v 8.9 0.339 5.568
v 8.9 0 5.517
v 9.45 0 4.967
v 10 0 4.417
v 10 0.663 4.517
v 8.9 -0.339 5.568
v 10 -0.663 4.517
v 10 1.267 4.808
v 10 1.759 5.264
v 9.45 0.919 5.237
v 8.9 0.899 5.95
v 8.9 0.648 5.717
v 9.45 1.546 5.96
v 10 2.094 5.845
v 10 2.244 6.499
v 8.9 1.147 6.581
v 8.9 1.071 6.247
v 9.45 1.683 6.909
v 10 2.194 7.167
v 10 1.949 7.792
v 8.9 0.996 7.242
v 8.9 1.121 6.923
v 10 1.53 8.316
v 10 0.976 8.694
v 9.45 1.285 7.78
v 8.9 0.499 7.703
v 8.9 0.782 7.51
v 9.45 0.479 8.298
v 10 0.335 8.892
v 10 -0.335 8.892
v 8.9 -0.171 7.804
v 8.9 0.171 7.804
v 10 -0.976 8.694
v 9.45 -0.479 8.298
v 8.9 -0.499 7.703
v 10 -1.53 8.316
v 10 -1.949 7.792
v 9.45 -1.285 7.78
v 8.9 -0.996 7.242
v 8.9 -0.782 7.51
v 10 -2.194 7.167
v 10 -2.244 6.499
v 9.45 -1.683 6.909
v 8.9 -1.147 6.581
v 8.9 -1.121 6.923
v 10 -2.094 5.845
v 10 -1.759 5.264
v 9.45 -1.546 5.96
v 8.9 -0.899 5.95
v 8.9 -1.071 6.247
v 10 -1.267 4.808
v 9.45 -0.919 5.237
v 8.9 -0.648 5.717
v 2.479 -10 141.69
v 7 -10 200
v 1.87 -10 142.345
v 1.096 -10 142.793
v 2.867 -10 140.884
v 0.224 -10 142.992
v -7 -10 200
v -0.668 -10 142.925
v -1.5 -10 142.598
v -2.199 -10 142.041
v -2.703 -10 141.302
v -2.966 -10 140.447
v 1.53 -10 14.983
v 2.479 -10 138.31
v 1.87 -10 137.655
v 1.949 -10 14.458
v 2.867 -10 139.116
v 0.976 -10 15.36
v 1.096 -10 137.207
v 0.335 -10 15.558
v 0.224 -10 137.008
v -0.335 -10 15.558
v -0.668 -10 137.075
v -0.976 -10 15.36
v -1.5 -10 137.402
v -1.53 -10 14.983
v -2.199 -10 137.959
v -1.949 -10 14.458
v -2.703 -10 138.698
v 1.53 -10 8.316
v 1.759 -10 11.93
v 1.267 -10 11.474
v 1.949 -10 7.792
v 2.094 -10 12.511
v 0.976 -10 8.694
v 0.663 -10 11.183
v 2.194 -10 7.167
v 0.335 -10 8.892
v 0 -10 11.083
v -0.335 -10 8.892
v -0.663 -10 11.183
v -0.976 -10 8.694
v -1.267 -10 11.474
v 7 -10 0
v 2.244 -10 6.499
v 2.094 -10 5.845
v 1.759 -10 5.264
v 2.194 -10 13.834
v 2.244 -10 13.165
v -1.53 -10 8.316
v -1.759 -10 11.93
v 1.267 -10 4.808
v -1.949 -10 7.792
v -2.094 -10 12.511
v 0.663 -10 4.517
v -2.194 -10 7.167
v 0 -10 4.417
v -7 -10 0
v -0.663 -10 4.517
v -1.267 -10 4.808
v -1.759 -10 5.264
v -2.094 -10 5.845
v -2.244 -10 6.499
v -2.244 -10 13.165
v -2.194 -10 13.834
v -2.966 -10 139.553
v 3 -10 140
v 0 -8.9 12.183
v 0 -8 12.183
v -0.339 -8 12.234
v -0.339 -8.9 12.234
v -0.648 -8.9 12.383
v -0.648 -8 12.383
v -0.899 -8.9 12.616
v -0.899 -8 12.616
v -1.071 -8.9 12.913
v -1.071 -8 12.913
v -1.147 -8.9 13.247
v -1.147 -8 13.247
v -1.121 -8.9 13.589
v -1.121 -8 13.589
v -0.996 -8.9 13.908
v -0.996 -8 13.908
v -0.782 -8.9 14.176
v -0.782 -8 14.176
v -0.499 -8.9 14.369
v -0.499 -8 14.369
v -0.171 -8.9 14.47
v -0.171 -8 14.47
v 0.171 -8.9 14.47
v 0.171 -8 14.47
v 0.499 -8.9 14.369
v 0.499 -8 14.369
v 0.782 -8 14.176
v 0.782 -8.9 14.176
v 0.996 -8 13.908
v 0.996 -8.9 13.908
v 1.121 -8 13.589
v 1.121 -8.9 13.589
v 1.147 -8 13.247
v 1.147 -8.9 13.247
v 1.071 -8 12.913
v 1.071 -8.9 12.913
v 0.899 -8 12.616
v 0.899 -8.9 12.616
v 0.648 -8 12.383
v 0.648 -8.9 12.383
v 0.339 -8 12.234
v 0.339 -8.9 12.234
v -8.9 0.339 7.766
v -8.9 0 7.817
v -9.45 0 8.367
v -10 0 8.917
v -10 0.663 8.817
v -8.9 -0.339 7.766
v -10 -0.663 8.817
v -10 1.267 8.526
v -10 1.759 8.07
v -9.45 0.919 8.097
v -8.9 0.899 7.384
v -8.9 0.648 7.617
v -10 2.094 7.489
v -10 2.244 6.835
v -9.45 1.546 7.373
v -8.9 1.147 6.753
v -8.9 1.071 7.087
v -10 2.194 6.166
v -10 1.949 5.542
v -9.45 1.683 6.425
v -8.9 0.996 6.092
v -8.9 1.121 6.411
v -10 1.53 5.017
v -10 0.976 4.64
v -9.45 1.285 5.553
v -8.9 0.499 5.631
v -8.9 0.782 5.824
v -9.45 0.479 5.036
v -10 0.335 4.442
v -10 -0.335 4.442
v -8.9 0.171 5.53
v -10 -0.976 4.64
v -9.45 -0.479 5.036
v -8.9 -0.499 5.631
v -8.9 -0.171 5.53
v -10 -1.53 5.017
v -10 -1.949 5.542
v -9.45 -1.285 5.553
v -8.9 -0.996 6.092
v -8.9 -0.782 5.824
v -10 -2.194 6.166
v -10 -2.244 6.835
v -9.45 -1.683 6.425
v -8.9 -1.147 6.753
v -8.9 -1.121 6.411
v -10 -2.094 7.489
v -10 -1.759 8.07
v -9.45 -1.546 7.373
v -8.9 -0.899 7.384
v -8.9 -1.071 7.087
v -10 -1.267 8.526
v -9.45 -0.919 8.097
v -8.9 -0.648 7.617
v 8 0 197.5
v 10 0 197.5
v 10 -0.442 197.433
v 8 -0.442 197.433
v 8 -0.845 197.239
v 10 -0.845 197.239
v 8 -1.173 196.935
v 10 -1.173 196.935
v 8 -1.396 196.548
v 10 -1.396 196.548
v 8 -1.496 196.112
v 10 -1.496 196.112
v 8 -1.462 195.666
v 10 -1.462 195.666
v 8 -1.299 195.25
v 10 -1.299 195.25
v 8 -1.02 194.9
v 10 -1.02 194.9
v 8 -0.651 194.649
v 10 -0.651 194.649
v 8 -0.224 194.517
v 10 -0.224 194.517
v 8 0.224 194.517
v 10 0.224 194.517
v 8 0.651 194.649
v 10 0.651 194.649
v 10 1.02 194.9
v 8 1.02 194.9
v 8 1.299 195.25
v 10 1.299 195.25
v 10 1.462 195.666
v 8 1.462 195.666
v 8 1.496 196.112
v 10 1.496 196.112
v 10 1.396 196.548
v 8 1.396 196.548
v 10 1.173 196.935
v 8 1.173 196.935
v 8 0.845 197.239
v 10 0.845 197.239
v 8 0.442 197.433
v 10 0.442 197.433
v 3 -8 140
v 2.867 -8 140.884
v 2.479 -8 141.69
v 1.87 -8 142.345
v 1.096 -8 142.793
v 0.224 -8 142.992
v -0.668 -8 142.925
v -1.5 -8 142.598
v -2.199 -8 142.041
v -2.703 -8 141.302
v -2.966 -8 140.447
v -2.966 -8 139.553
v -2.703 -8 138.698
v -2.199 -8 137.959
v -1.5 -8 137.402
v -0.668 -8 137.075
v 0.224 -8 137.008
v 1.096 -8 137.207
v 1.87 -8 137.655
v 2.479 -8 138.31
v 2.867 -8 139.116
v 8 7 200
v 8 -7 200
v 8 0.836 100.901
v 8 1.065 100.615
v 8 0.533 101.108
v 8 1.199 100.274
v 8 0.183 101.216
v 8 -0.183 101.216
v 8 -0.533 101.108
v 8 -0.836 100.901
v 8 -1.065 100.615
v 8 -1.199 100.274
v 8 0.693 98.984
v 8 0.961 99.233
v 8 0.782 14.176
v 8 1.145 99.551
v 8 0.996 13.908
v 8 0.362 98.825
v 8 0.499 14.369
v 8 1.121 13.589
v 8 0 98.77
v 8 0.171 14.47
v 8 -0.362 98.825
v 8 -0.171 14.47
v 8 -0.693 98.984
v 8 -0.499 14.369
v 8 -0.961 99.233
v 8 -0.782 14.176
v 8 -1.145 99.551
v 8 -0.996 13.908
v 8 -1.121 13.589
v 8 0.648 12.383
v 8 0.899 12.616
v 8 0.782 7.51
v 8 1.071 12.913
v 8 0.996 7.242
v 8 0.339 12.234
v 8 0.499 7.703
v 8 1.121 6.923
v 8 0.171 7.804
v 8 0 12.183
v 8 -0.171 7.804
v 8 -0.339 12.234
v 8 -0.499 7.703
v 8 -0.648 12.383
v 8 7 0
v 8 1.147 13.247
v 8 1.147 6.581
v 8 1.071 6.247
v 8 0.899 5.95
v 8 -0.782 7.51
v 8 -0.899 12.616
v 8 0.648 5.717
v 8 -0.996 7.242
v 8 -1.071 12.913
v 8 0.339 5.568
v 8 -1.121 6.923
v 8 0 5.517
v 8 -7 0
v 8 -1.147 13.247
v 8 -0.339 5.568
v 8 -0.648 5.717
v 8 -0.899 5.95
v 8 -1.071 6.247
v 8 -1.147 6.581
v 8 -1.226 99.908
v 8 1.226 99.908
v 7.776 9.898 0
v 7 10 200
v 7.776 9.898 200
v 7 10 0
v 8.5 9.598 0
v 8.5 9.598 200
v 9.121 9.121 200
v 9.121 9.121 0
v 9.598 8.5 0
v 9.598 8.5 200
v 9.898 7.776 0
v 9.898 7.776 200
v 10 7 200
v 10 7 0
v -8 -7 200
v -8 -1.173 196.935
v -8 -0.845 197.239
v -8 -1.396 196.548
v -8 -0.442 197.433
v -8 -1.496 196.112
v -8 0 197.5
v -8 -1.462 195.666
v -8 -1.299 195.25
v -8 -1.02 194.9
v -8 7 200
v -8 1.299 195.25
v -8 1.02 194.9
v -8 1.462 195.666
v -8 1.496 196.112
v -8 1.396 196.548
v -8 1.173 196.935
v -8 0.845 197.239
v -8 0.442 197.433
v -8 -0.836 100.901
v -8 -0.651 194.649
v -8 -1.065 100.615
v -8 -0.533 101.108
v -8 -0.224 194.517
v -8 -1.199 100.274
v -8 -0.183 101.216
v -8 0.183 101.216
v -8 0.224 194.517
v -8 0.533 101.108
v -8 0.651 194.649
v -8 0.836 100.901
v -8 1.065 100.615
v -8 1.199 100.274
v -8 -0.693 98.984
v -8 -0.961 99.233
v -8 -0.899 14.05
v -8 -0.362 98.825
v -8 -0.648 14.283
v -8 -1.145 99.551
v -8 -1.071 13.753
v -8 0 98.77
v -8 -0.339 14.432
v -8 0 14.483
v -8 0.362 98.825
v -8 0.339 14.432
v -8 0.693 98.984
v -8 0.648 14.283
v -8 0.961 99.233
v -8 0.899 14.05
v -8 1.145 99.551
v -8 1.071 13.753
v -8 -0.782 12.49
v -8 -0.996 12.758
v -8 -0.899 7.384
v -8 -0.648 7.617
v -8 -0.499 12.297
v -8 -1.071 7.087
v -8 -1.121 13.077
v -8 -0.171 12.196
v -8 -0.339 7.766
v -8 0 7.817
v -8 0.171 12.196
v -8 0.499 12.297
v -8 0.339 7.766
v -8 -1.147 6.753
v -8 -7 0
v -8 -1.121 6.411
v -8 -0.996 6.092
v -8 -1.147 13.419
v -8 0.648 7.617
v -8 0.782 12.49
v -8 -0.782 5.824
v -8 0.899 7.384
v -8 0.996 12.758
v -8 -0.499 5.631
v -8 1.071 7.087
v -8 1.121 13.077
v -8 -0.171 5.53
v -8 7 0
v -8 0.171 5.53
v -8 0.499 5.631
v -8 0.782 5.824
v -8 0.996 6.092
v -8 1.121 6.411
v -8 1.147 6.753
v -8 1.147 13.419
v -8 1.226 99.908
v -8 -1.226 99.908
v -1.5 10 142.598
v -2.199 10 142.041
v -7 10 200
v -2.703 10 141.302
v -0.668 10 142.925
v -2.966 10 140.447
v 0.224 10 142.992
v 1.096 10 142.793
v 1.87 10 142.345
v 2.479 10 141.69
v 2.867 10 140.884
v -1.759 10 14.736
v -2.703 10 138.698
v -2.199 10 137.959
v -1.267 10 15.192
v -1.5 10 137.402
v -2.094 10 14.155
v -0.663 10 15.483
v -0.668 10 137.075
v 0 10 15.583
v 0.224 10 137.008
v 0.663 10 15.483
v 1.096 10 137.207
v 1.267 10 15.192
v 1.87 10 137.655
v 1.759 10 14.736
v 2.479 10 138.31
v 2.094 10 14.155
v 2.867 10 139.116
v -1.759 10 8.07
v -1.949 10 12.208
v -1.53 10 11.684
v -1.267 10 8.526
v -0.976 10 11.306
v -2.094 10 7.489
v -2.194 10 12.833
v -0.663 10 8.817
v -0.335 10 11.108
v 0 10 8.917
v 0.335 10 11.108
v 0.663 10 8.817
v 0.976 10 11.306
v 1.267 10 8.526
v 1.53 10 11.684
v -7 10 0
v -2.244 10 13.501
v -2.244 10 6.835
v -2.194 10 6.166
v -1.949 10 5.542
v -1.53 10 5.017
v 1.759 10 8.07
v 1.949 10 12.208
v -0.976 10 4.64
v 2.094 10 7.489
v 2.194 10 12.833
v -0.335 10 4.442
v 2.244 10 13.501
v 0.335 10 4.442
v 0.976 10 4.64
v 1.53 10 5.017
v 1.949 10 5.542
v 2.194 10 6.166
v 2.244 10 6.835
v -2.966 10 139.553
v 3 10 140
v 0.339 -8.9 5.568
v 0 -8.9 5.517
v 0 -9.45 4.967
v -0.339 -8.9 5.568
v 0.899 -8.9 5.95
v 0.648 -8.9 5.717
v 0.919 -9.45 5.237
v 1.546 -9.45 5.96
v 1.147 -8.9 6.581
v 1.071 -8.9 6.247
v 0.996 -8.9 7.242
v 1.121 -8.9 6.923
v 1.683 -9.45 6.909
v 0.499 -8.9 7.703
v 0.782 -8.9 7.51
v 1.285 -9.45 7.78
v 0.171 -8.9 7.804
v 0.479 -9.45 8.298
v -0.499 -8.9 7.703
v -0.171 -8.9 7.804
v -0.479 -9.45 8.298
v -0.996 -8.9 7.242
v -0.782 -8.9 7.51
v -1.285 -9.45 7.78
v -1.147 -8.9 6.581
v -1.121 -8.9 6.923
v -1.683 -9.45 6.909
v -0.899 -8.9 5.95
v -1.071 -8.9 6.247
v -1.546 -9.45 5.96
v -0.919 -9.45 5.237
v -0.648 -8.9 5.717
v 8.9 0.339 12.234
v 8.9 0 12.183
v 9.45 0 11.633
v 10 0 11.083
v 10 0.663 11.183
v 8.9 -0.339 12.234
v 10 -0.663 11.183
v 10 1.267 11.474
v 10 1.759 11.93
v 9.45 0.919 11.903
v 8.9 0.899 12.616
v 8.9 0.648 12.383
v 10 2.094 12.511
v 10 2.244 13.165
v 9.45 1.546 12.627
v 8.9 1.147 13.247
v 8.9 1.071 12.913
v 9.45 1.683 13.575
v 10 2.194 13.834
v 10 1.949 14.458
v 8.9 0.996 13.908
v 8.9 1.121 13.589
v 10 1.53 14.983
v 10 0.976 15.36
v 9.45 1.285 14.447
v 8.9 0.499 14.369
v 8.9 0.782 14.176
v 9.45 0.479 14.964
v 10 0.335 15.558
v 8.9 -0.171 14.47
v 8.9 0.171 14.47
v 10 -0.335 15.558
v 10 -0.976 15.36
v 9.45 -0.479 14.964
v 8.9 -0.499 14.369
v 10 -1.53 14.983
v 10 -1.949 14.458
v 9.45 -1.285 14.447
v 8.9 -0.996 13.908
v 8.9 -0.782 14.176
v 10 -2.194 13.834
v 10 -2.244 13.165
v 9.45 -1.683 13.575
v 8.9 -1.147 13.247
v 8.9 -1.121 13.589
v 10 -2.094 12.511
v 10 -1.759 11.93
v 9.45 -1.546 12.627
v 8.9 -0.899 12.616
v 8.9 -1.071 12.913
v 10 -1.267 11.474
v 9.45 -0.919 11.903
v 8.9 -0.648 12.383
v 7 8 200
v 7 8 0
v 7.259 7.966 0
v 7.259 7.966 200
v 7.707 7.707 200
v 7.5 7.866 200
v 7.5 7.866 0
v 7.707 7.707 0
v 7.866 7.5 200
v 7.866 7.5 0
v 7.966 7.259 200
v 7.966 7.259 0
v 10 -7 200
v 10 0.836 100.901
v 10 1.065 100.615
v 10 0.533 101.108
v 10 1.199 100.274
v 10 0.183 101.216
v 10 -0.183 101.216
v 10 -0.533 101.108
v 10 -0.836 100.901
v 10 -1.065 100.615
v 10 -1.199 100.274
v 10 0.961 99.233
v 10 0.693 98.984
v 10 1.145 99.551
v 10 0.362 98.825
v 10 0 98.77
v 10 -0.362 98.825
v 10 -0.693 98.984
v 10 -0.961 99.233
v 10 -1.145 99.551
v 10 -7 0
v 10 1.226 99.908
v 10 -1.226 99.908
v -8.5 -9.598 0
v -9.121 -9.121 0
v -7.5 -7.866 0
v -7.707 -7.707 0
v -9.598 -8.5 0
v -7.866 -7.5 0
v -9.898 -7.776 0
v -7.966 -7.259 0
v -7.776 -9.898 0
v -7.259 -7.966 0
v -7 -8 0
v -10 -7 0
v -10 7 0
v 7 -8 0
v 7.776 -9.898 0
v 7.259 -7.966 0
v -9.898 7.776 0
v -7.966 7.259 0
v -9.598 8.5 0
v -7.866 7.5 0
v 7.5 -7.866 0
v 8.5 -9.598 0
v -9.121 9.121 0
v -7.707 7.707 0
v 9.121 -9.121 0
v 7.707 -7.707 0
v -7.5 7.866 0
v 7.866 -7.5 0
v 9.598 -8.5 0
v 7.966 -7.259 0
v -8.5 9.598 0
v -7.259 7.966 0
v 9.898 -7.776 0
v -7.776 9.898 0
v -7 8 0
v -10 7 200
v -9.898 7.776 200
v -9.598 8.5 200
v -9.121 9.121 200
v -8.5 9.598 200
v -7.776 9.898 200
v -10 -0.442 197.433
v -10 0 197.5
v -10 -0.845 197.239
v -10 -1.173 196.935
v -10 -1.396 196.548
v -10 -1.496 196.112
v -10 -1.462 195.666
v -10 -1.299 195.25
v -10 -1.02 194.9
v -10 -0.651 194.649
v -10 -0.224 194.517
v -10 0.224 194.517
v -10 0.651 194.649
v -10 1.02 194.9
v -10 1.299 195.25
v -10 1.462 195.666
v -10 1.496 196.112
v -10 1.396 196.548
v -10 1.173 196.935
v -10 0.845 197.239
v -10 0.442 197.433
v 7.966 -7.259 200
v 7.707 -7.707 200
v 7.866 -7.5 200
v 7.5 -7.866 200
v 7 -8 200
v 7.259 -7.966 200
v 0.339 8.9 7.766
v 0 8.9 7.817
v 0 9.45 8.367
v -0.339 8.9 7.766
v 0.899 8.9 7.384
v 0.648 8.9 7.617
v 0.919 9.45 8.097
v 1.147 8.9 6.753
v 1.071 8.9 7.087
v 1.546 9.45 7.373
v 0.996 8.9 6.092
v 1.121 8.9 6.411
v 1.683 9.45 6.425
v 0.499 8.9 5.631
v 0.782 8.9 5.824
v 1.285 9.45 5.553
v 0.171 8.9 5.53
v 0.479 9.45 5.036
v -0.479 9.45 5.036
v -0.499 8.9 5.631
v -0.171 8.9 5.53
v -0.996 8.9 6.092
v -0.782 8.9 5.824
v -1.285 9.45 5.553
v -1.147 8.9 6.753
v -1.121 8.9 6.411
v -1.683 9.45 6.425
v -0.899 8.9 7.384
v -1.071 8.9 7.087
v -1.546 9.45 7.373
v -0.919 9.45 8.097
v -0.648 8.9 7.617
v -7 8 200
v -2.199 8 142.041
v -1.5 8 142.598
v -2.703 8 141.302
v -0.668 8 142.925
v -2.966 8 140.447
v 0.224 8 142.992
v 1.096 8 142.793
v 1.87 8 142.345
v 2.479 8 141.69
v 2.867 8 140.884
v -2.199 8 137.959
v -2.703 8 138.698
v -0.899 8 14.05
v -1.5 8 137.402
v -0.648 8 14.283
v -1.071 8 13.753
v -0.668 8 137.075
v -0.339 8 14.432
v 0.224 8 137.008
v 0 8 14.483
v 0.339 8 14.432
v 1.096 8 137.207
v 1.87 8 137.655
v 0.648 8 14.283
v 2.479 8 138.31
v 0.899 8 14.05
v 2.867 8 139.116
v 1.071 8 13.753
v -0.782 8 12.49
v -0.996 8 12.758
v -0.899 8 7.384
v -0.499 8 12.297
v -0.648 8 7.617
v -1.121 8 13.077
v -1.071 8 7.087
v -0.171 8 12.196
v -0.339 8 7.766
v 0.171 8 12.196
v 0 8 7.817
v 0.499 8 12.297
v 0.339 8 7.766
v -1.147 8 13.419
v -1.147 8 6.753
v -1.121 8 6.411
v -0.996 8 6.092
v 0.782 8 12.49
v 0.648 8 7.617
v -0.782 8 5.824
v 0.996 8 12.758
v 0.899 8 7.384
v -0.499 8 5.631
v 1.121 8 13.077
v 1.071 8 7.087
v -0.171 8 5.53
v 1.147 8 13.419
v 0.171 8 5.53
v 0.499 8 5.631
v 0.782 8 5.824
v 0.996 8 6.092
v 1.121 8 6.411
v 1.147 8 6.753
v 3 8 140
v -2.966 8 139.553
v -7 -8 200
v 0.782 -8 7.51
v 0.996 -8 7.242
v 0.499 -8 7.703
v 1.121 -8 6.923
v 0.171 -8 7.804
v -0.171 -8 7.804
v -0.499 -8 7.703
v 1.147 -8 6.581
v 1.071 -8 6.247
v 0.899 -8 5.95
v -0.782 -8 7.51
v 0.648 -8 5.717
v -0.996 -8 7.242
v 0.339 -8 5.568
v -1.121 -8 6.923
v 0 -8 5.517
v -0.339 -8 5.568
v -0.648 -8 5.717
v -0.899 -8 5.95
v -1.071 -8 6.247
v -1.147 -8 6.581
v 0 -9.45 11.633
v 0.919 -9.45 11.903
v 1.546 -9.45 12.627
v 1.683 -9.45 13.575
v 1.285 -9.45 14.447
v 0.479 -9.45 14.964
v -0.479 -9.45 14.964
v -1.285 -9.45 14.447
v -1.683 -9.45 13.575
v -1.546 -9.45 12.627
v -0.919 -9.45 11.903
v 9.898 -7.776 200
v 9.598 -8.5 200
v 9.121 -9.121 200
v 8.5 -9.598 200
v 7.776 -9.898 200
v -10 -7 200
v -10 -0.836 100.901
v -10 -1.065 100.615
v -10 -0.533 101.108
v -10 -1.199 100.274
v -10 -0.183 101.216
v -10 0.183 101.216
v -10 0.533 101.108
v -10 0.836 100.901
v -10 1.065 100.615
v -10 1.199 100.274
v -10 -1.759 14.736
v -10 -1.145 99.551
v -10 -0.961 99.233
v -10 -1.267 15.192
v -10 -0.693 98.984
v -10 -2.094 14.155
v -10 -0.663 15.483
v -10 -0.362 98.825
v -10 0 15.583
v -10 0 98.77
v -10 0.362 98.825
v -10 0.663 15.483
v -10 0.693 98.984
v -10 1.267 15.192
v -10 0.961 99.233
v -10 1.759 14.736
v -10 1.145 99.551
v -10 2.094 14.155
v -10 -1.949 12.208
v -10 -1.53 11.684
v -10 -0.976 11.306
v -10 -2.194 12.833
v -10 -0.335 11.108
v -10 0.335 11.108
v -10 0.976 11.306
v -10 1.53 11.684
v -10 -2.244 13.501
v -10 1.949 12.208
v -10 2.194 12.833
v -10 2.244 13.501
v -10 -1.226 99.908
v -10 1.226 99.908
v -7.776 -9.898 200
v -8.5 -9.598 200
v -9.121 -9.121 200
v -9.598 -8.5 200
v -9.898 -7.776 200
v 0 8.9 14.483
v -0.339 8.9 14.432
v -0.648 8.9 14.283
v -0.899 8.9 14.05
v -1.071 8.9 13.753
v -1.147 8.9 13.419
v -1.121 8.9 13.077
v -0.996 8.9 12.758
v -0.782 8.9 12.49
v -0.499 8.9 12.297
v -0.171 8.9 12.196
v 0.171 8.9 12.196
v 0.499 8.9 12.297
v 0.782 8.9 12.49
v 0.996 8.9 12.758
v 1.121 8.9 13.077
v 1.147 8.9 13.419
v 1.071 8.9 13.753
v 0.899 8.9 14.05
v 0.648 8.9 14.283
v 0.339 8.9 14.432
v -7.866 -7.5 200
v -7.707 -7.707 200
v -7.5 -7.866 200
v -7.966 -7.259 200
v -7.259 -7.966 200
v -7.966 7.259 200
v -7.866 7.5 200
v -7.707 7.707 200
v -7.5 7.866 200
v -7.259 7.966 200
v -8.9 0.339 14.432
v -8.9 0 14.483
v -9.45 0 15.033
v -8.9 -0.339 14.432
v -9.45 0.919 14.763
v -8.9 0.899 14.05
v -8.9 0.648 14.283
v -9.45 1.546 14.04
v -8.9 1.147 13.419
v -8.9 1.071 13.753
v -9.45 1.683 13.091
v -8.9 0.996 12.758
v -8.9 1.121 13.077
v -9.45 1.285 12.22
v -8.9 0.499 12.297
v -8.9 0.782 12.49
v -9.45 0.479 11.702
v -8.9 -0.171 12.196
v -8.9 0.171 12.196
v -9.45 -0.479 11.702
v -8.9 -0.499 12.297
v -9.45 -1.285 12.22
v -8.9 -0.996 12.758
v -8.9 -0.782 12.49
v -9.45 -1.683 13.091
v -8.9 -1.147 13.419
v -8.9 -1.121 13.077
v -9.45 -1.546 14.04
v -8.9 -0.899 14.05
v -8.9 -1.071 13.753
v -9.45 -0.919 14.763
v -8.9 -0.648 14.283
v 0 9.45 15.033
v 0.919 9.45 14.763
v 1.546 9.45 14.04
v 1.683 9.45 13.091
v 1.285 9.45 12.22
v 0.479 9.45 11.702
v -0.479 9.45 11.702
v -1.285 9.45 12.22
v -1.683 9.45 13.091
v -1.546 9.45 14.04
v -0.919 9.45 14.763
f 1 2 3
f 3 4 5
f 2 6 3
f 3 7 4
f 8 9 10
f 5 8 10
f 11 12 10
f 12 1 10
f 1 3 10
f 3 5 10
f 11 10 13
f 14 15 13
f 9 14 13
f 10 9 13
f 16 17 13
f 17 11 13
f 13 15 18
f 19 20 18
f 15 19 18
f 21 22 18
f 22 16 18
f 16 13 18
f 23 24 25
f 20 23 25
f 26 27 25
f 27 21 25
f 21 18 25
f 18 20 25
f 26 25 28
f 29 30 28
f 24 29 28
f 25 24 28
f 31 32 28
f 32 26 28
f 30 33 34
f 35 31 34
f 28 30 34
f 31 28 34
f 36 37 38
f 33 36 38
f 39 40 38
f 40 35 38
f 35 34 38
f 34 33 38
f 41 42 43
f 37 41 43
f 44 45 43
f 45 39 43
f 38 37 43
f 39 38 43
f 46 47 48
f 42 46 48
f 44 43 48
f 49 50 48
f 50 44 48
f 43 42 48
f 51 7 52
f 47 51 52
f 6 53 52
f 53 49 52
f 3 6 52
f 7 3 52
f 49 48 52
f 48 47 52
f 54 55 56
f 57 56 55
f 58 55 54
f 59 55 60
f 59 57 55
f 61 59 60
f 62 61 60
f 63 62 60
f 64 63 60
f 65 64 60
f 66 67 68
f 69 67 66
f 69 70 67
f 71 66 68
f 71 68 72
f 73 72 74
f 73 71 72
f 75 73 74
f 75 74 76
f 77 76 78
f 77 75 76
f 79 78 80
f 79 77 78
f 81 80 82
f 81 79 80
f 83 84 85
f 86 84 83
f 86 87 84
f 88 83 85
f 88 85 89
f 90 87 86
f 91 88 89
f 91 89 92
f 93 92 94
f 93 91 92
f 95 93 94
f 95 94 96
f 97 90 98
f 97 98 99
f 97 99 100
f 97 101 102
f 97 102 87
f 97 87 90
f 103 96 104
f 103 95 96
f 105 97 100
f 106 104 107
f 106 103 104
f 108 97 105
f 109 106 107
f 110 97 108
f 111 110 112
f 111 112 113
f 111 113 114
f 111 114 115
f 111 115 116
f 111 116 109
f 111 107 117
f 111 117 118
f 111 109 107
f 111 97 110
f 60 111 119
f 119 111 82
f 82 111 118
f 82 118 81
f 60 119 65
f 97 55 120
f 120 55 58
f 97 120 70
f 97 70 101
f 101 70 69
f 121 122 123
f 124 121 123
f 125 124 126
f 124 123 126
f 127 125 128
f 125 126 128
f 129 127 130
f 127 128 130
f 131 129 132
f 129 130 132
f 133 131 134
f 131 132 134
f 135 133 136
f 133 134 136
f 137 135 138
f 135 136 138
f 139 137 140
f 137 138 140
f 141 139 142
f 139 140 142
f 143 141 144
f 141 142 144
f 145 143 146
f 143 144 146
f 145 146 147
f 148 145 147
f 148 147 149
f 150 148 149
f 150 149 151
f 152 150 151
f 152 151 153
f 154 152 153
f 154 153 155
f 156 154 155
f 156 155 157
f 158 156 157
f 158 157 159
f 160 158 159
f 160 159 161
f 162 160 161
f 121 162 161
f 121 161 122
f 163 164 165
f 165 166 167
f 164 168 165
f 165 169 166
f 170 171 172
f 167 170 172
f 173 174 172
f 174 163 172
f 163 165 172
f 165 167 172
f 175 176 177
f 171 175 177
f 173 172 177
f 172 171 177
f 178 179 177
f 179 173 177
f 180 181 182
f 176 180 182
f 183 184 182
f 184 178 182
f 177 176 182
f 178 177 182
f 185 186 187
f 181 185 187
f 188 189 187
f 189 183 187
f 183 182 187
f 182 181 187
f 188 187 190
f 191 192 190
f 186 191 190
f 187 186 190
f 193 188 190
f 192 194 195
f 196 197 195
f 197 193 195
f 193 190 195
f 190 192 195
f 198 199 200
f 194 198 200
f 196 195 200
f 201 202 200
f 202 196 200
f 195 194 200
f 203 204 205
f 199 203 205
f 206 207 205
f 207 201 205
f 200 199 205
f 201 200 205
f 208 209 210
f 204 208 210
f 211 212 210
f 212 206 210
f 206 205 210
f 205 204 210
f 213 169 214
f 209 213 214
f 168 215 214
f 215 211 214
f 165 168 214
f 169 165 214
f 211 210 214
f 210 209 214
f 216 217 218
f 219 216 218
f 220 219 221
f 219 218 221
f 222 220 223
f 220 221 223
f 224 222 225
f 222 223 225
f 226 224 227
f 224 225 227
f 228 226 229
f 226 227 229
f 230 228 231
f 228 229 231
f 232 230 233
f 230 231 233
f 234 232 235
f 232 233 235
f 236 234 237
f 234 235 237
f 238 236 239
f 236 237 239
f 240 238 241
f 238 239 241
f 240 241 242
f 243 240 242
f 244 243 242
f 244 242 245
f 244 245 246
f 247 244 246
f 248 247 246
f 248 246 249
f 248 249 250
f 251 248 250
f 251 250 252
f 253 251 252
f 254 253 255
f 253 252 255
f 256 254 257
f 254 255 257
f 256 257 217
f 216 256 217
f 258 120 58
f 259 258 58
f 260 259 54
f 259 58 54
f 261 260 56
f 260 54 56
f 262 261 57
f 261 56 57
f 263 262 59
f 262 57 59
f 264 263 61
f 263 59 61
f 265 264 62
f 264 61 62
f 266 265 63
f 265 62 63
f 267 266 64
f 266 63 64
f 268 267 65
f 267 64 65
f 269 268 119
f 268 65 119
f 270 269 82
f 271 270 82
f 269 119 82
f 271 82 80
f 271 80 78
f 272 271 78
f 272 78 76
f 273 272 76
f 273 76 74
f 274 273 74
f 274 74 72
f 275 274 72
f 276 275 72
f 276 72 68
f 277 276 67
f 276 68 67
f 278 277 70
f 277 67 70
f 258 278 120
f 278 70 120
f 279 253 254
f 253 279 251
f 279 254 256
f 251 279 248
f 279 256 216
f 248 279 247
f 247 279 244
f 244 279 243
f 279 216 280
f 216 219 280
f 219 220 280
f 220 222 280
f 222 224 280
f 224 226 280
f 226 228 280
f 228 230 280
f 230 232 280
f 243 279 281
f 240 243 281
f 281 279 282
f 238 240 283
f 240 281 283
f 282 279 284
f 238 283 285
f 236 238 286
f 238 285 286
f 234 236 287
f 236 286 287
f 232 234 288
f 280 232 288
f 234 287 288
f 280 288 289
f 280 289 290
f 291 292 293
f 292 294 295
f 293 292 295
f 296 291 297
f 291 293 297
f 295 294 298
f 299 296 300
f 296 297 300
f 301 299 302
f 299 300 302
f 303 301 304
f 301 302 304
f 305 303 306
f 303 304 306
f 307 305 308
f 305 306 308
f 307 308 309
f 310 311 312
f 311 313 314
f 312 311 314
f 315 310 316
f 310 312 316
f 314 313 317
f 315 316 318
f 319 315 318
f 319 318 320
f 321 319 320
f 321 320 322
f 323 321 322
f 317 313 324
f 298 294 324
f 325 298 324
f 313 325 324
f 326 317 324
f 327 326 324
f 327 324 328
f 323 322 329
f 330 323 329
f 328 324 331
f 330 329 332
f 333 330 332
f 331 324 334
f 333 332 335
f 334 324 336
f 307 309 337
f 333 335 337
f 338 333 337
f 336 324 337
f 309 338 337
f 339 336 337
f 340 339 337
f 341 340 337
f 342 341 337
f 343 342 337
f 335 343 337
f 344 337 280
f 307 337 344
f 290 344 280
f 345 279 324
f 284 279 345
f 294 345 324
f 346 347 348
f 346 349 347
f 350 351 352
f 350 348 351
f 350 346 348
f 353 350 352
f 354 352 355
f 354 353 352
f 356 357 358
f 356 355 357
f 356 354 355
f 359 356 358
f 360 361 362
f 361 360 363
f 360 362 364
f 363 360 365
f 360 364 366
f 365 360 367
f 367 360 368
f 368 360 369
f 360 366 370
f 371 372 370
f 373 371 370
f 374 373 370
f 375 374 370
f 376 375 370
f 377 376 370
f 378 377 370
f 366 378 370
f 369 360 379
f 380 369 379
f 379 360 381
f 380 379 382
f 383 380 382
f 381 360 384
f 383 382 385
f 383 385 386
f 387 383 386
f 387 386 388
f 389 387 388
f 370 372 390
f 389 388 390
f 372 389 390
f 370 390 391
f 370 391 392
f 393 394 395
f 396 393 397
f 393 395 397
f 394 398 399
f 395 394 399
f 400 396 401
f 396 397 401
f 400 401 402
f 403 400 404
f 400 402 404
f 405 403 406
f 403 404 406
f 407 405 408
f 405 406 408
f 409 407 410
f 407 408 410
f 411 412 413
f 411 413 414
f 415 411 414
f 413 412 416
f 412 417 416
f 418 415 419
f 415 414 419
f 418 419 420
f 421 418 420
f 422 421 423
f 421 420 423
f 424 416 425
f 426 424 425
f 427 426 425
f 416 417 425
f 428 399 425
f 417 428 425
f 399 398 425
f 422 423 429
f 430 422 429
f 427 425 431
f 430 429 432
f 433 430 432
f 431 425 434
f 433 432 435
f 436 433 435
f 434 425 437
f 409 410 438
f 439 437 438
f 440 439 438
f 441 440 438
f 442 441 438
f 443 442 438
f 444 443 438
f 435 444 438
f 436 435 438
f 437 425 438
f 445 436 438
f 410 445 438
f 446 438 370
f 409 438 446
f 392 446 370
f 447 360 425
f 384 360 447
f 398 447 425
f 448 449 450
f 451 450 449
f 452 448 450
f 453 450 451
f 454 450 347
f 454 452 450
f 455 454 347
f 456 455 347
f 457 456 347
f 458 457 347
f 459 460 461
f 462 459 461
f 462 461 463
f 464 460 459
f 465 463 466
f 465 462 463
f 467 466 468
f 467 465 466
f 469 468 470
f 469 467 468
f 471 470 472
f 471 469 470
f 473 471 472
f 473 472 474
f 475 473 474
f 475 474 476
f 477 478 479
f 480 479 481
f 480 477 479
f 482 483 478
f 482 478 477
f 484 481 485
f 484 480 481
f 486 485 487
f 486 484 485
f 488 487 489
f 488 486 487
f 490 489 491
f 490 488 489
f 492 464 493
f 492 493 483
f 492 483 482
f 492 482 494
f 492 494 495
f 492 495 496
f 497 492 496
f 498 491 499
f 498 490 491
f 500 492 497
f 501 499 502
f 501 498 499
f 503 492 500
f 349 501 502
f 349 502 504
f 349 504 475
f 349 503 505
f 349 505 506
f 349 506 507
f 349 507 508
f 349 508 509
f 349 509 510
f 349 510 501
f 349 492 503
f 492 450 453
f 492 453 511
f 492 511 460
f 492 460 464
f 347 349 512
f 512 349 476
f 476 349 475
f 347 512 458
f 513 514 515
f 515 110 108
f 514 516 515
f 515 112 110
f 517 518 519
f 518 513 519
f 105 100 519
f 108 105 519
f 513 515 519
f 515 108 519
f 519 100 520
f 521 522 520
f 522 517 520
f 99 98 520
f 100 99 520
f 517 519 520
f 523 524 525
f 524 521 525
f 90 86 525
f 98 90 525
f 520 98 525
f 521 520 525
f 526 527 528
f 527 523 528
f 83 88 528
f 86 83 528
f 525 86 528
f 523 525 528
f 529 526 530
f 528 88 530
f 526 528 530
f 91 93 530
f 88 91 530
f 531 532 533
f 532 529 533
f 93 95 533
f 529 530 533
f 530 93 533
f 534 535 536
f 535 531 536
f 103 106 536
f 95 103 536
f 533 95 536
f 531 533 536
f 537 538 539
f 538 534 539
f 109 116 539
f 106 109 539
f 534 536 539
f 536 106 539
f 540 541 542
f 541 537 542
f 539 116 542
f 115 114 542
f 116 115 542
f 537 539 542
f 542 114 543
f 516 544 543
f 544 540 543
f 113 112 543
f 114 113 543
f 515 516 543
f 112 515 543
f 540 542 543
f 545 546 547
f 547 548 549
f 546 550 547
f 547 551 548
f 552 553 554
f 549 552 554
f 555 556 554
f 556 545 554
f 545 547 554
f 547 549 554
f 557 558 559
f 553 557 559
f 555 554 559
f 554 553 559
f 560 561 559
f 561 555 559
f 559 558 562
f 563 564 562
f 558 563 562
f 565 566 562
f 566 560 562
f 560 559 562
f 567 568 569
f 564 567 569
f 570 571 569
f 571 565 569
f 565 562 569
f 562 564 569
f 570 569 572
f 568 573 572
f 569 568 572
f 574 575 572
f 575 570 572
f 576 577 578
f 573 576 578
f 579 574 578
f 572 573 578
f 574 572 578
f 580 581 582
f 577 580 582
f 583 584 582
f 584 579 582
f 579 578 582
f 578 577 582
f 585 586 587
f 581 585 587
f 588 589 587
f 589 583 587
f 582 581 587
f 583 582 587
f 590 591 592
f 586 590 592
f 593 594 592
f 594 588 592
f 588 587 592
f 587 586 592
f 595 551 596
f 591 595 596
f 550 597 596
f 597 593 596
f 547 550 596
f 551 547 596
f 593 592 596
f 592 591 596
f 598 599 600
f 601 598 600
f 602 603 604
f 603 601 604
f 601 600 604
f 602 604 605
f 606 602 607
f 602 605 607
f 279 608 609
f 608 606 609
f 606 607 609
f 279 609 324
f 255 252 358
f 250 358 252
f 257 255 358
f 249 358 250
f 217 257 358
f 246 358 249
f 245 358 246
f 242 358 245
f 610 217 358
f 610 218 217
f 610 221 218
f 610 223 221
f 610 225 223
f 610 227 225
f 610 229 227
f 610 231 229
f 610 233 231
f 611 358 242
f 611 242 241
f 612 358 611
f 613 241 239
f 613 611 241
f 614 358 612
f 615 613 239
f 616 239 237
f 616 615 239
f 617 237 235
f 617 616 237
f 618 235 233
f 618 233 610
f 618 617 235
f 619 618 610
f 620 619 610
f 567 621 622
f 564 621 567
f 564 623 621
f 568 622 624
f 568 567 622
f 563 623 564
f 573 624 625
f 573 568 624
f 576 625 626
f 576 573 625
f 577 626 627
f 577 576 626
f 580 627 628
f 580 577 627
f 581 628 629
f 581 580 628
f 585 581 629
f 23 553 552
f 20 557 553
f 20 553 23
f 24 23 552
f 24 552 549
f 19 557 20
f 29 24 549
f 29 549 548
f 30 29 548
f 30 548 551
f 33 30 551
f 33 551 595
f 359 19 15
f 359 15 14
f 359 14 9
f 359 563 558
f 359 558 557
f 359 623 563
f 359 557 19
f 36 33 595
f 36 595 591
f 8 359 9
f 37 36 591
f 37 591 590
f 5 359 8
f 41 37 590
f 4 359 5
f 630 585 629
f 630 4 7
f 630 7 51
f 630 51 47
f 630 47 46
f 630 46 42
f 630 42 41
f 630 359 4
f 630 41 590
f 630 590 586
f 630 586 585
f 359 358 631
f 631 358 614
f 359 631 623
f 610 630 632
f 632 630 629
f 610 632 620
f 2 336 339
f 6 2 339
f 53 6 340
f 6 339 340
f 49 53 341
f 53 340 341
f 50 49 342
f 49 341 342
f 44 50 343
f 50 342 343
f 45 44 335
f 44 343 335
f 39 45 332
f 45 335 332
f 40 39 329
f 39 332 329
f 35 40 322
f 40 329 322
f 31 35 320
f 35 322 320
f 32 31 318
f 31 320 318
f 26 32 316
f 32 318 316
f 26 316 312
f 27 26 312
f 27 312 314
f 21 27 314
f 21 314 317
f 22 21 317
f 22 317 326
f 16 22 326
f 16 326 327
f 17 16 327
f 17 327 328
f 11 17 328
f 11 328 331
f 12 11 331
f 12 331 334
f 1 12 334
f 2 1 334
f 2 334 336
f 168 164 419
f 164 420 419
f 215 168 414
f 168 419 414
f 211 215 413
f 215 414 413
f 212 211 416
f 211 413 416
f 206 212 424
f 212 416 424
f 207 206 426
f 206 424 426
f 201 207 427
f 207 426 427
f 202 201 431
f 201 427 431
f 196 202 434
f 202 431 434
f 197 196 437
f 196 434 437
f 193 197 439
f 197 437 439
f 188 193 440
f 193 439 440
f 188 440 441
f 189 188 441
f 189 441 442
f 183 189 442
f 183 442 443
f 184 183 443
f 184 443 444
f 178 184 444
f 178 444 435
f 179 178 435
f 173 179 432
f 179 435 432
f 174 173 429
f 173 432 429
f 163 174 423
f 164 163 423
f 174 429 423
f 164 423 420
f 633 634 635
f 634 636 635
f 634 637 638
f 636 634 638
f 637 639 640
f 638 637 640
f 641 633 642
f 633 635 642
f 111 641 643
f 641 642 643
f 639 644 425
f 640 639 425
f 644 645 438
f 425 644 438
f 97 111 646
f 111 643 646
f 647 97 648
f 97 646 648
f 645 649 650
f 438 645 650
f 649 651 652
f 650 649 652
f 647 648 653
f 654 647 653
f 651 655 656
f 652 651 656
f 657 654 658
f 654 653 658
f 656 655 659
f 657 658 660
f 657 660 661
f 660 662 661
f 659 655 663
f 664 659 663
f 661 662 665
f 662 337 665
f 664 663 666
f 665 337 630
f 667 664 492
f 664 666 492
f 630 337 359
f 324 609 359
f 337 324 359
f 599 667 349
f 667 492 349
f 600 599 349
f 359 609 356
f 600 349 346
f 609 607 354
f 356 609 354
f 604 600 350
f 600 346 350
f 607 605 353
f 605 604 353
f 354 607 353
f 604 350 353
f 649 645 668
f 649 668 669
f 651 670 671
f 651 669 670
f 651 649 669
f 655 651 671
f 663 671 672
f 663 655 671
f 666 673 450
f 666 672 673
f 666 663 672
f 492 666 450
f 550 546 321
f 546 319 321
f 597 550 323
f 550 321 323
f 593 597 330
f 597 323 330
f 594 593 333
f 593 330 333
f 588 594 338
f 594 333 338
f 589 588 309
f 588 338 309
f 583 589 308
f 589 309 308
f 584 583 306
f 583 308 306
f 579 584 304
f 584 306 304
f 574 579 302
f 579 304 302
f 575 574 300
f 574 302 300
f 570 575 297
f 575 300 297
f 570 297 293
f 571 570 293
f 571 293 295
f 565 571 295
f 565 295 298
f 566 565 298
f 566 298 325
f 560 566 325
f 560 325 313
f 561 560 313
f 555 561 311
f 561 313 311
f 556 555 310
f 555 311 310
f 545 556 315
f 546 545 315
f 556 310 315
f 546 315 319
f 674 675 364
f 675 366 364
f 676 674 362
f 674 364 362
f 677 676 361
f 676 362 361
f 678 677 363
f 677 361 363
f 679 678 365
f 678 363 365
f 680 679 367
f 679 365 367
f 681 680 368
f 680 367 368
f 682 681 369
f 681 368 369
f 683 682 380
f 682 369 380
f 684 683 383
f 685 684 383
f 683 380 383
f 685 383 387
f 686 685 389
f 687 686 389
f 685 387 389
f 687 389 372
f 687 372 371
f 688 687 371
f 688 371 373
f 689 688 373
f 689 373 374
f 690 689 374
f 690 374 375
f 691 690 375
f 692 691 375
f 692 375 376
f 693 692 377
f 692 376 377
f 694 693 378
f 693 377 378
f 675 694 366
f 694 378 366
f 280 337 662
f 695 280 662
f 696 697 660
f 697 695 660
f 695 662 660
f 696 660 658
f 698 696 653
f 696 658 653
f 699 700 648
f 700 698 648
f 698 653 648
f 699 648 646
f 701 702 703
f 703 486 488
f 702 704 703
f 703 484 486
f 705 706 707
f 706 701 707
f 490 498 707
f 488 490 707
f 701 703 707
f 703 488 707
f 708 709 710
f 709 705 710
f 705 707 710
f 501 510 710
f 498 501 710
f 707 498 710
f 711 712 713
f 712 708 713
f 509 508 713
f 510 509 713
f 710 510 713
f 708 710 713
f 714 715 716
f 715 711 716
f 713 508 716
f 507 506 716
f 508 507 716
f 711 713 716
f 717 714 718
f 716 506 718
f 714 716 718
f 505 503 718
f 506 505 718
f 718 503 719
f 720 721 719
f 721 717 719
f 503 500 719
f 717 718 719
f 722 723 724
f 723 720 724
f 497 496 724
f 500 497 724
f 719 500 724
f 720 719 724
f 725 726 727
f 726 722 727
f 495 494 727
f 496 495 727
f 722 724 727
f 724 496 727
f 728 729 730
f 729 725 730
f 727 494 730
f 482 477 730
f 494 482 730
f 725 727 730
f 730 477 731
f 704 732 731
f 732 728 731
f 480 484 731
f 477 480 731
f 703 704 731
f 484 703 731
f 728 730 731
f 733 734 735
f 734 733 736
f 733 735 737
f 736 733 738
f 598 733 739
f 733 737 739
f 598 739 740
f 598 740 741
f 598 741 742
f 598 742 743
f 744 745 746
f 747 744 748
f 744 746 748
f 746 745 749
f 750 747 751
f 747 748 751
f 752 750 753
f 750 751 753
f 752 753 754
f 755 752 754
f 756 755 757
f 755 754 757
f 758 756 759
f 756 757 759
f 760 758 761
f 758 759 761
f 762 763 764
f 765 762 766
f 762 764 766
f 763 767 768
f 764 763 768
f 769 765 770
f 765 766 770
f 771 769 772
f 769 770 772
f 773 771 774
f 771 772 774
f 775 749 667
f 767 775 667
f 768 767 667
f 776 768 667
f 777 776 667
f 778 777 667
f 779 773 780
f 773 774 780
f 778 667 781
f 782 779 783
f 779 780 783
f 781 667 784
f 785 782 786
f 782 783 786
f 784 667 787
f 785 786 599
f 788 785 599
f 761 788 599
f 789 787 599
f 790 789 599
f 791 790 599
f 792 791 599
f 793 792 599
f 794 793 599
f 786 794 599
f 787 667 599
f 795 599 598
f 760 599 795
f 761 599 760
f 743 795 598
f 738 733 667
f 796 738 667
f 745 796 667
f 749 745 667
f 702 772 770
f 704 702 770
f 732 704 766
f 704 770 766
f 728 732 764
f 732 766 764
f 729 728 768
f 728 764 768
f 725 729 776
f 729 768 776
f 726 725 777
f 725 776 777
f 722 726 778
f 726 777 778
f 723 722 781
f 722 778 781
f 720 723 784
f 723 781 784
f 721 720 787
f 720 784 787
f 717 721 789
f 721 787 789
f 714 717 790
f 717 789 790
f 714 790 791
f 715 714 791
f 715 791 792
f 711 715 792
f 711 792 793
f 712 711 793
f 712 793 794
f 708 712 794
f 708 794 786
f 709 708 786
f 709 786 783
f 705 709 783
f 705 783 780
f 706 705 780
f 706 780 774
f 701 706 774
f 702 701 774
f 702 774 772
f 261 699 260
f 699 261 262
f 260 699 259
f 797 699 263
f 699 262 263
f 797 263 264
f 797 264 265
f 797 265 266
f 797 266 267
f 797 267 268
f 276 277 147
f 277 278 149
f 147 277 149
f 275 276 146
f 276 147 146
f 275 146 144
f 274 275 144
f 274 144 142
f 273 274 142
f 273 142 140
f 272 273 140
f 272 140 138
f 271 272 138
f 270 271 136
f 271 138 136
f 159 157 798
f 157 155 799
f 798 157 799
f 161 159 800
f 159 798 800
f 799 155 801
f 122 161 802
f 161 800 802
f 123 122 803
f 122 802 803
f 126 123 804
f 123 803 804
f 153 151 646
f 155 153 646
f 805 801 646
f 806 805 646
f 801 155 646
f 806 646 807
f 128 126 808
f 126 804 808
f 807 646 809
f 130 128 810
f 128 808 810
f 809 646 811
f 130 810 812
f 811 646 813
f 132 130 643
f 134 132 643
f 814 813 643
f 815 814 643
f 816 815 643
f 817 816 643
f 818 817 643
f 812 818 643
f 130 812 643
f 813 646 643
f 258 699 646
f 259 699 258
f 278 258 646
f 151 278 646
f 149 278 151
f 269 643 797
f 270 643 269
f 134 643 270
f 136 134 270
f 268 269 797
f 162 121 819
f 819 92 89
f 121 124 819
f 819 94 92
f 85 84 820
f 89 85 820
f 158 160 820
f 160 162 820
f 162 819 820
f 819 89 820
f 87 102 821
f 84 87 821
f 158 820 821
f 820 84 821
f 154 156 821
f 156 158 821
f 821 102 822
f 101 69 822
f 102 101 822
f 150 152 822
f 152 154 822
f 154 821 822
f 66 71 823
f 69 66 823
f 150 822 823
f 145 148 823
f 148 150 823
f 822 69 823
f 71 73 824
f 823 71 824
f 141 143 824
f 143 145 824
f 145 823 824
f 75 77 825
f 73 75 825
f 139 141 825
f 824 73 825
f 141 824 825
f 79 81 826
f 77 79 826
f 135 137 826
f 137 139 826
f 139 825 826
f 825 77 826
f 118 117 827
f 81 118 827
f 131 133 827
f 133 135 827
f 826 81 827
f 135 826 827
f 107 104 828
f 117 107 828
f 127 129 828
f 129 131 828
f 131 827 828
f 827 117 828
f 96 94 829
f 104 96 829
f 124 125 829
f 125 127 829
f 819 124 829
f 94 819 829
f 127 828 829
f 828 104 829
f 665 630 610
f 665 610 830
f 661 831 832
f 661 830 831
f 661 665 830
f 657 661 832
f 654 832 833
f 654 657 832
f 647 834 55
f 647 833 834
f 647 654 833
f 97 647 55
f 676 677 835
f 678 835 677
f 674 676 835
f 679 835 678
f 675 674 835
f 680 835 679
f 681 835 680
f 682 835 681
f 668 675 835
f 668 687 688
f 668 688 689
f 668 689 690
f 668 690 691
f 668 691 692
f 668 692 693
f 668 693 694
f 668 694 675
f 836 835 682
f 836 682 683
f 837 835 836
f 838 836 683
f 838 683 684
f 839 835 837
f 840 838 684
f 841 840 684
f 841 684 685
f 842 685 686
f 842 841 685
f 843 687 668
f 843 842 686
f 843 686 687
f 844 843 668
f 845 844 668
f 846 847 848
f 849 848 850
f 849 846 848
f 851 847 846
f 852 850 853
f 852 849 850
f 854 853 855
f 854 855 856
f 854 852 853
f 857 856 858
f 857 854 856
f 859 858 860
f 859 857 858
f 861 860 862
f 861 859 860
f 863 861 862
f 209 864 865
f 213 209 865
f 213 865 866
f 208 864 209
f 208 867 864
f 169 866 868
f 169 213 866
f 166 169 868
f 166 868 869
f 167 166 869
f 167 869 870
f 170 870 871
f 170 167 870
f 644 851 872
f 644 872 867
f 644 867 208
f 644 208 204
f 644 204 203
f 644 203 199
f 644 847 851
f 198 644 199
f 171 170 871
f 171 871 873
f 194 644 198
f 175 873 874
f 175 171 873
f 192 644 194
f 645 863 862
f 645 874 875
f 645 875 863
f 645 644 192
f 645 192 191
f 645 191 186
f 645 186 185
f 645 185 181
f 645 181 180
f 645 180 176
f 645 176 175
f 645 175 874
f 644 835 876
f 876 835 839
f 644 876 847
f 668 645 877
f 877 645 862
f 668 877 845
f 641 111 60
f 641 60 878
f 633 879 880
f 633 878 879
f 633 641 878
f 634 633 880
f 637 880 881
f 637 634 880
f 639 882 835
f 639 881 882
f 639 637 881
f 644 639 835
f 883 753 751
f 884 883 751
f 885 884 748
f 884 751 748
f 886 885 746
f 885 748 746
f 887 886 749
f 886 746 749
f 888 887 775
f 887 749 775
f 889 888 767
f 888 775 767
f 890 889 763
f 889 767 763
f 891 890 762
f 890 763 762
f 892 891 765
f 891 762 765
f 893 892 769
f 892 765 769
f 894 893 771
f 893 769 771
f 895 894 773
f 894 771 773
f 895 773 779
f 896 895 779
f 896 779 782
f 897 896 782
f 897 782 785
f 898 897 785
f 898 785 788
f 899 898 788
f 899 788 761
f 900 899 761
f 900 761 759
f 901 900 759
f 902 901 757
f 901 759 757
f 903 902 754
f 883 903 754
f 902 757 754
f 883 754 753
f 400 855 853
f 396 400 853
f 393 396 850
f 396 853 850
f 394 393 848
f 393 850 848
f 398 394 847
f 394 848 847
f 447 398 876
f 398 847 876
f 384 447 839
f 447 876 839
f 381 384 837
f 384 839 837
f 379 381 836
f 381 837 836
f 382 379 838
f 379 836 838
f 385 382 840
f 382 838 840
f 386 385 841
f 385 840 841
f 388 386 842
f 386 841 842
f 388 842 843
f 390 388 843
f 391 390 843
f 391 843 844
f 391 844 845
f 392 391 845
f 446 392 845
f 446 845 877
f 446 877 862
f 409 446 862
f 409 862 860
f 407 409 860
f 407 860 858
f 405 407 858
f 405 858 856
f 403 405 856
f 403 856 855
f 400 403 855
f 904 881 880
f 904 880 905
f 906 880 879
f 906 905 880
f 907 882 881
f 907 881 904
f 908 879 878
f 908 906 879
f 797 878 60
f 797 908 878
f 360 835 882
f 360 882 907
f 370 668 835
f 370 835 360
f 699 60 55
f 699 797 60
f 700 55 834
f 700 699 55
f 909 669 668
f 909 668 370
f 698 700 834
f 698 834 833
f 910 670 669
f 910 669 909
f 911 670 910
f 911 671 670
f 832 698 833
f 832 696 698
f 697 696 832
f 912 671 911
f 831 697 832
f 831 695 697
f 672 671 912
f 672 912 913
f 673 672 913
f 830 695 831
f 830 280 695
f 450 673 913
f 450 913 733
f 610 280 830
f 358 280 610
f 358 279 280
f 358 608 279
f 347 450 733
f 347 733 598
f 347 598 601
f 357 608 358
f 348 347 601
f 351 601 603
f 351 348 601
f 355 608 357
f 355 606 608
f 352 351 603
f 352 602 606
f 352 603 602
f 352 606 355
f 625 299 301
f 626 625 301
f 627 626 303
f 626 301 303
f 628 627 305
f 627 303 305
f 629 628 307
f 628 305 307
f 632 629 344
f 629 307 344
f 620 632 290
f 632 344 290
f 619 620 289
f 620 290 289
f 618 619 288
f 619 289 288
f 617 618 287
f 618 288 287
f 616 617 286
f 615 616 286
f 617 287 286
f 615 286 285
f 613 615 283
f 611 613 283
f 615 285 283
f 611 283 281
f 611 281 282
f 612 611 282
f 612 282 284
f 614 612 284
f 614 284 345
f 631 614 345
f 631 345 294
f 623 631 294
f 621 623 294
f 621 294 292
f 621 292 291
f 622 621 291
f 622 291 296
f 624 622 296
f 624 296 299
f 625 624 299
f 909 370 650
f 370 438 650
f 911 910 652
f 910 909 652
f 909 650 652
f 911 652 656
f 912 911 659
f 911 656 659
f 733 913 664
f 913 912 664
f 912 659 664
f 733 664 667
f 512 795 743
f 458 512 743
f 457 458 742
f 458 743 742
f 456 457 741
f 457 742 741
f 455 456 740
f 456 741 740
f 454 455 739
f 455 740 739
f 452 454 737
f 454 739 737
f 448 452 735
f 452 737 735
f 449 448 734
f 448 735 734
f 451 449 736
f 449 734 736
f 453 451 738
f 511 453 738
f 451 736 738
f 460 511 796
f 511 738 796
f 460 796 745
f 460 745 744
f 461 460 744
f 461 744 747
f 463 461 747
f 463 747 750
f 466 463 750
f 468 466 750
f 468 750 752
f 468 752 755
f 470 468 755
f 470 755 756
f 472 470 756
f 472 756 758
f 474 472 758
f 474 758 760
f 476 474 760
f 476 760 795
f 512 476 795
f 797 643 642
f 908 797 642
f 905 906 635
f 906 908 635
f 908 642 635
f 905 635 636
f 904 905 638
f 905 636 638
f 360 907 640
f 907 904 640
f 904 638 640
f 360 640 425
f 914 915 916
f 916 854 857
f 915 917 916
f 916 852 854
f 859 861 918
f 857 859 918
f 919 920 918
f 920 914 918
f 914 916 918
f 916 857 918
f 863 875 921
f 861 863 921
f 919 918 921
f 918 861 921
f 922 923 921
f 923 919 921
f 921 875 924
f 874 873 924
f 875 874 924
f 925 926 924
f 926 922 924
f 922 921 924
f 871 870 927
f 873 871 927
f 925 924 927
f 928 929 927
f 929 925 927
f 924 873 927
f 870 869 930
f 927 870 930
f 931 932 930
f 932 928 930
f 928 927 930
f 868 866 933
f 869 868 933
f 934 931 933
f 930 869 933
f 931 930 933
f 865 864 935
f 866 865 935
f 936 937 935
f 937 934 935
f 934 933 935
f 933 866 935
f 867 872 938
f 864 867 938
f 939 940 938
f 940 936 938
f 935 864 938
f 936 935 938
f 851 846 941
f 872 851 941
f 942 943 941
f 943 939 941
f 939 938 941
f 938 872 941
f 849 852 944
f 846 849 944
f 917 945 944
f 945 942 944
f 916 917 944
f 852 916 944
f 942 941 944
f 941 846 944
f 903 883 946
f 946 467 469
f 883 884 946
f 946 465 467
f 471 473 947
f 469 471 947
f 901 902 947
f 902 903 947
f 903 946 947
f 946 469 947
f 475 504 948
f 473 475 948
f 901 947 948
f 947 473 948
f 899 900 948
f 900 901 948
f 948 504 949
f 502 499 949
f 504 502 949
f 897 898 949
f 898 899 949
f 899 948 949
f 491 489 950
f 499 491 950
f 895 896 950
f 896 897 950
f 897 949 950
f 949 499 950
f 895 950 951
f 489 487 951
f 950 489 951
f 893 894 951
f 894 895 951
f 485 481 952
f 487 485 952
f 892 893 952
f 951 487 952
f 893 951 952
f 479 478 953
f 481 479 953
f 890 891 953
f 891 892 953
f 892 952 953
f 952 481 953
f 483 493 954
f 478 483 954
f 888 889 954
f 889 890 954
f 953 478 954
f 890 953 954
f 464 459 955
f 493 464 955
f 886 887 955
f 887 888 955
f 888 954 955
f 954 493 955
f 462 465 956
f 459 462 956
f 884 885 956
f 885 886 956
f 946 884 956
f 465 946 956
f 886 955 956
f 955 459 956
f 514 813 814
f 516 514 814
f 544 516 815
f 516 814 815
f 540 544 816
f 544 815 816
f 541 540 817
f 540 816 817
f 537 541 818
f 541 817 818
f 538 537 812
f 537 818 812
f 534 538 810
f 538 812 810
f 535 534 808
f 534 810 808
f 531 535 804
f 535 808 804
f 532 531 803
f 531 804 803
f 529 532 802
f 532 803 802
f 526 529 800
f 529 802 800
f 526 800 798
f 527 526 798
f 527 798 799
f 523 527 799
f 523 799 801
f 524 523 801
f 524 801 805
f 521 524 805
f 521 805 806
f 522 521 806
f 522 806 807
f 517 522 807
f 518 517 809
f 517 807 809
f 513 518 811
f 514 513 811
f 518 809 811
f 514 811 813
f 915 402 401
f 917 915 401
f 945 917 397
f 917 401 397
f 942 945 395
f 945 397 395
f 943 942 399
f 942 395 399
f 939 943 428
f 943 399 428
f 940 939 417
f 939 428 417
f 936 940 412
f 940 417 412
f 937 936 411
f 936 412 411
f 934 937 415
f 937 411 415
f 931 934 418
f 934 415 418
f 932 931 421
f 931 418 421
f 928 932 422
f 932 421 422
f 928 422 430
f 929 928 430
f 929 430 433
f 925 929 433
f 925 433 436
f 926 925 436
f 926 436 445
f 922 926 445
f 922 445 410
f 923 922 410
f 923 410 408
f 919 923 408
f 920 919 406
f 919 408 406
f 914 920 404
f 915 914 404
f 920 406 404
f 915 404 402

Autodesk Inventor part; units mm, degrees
ref_plane "YZ Plane" through (0, 0, 0) normal (1, 0, 0) x (0, 1, 0)
ref_plane "Startebene" through (0, 0, 0) normal (0, 0, 1) x (1, 0, 0)
ref_plane "Endebene" through (0, 0, 200) normal (0, 0, 1) x (1, 0, 0)
sketch "Skizze" plane through (0, 0, 0) normal (0, 0, 1) x (1, 0, 0)
  line L0 (-10, -7) -> (-10, 7)
  line L1 (-7, 10) -> (7, 10)
  line L2 (10, 7) -> (10, -7)
  line L3 (7, -10) -> (-7, -10)
  arc A0 (-10, -7) -> (-7, -10) centre (-7, -7) ccw
  arc A1 (-7, 10) -> (-10, 7) centre (-7, 7) ccw
  arc A2 (10, 7) -> (7, 10) centre (7, 7) ccw
  arc A3 (7, -10) -> (10, -7) centre (7, -7) ccw
  arc A4 (-7, 8) -> (-8, 7) centre (-7, 7) ccw
  line L4 (-7, 8) -> (7, 8)
  arc A5 (8, 7) -> (7, 8) centre (7, 7) ccw
  line L5 (8, 7) -> (8, -7)
  arc A6 (7, -8) -> (8, -7) centre (7, -7) ccw
  line L6 (7, -8) -> (-7, -8)
  arc A7 (-8, -7) -> (-7, -8) centre (-7, -7) ccw
  line L7 (-8, -7) -> (-8, 7)
  line L8 (0, 37.1021) -> (0, -37.1021) construction
  line L9 (-23.1021, 0) -> (23.1021, 0) construction
  dimension "d7" = 3
  dimension "d10" = 20
  dimension "d11" = 20
  dimension "d12" = 2
  dimension "d15" = 10
  dimension "d16" = 10
extrude "Körper" add sketch "Skizze" along normal up to surface (200 mm away) from surface at 0
sketch "Sketch3" plane through (0, 0, 0) normal (0, 0, 1) x (1, 0, 0)
  line L0 (0, 0) -> (10, 0)
ref_plane "Work Plane3" through (0, 0, 0) normal (0, -1, 0) x (1, 0, 0)
sketch "Skizze5" plane through (10, -7, 200) normal (1, 0, 0) x (0, 0, -1)
  circle A0 centre (193.3333, 7) radius 0.9 projected
  circle A1 centre (186.6667, 7) radius 0.9 projected
  point P0 (200, 7)
hole "Bohrung1" at (10, 0, 6.6667) at (10, 0, 13.3333) direction (-1, 0, 0) diameter 2.3 depth 8 tip angle 118 countersink diameter 4.5 countersink angle 90
sketch "Skizze6" plane through (-10, 7, 0) normal (-1, 0, 0) x (0, 0, 1)
  circle A0 centre (6.6667, -7) radius 0.9 projected
  circle A1 centre (13.3333, -7) radius 0.9 projected
  point P0 (0, -7)
hole "Bohrung2" at (-10, 0, 6.6667) at (-10, 0, 13.3333) direction (1, 0, 0) diameter 2.3 depth 8 tip angle 118 countersink diameter 4.5 countersink angle 90
sketch "Skizze7" plane through (-7, -10, 0) normal (0, -1, 0) x (1, 0, 0)
  circle A0 centre (7, 6.6667) radius 0.9 projected
  circle A1 centre (7, 13.3333) radius 0.9 projected
  point P0 (7, 0)
hole "Bohrung3" at (0, -10, 6.6667) at (0, -10, 13.3333) direction (0, 1, 0) diameter 2.3 depth 8 tip angle 118 countersink diameter 4.5 countersink angle 90
sketch "Skizze8" plane through (7, 10, 200) normal (0, 1, 0) x (1, 0, 0)
  circle A0 centre (-7, 186.6667) radius 0.9 projected
  circle A1 centre (-7, 193.3333) radius 0.9 projected
  point P0 (-7, 200)
hole "Bohrung4" at (0, 10, 13.3333) at (0, 10, 6.6667) direction (0, -1, 0) diameter 2.3 depth 8 tip angle 118 countersink diameter 4.5 countersink angle 90
sketch "Skizze9" plane through (-7, -10, 0) normal (0, -1, 0) x (1, 0, 0)
  circle A0 centre (7, 140) radius 3
  line L0 (7, 140) -> (7, 200)
  line L1 (14, 200) -> (0, 200) projected
  line L2 (14, 200) -> (0, 200) projected
  point P0 (7, 0)
  dimension "d47" = 6
  dimension "d48" = 60
extrude "Extrusion2" cut sketch "Skizze9" against normal through all
sketch "Skizze10" plane through (10, -7, 200) normal (1, 0, 0) x (0, 0, -1)
  line L0 (200, 14) -> (0, 14) construction
  line L1 (100, 14) -> (100, 7) construction
  line L2 (100, 7) -> (100, 0) construction
  line L3 (200, 0) -> (0, 0) construction
  line L4 (57, 17) -> (63, 17) construction
  point P0 (200, 7)
  point P1 (60, 17)
  dimension "d51" = 40
hole "Bohrung5" at (10, 0, 100) direction (-1, 0, 0) diameter 2.459 end through all thread size "M3x0.5" class "6H" standard "ANSI Metric M Profile"
sketch "Skizze11" plane through (-10, 7, 0) normal (-1, 0, 0) x (0, 0, 1)
  line L0 (196, -7) -> (200, -7)
  line L1 (200, -14) -> (200, 0) projected
  point P0 (0, -7)
  dimension "d59" = 4
hole "Bohrung6" at (-10, 0, 196) direction (1, 0, 0) diameter 3 end through all
sketch "Sketch4" plane through (0, 0, 0) normal (0, -1, 0) x (1, 0, 0)
  line L0 (-2, 0) -> (12, 0) projected
  line L1 (-2, 200) -> (12, 200) projected
  dimension "d18" = 200
equation "\"d7\" = G_IR"
equation "\"d10\" = G_H"
equation "\"d11\" = G_W"
equation "\"d12\" = G_T"
equation "\"d15\" = 0.5 * d10"
equation "\"d16\" = 0.5 * d11"
equation "\"d3\" = G_L"
equation "\"G_W\" = 20"
equation "\"G_H\" = 20"
equation "\"G_T\" = 2"
equation "\"G_IR\" = 3"
equation "\"G_L\" = d18"
equation "\"G_OFFSET_START\" = 0"
equation "\"G_OFFSET_END\" = 0"
properties part number "ISO 12633-2 - 20x20x2 - 200" material "Stahl, weich"
